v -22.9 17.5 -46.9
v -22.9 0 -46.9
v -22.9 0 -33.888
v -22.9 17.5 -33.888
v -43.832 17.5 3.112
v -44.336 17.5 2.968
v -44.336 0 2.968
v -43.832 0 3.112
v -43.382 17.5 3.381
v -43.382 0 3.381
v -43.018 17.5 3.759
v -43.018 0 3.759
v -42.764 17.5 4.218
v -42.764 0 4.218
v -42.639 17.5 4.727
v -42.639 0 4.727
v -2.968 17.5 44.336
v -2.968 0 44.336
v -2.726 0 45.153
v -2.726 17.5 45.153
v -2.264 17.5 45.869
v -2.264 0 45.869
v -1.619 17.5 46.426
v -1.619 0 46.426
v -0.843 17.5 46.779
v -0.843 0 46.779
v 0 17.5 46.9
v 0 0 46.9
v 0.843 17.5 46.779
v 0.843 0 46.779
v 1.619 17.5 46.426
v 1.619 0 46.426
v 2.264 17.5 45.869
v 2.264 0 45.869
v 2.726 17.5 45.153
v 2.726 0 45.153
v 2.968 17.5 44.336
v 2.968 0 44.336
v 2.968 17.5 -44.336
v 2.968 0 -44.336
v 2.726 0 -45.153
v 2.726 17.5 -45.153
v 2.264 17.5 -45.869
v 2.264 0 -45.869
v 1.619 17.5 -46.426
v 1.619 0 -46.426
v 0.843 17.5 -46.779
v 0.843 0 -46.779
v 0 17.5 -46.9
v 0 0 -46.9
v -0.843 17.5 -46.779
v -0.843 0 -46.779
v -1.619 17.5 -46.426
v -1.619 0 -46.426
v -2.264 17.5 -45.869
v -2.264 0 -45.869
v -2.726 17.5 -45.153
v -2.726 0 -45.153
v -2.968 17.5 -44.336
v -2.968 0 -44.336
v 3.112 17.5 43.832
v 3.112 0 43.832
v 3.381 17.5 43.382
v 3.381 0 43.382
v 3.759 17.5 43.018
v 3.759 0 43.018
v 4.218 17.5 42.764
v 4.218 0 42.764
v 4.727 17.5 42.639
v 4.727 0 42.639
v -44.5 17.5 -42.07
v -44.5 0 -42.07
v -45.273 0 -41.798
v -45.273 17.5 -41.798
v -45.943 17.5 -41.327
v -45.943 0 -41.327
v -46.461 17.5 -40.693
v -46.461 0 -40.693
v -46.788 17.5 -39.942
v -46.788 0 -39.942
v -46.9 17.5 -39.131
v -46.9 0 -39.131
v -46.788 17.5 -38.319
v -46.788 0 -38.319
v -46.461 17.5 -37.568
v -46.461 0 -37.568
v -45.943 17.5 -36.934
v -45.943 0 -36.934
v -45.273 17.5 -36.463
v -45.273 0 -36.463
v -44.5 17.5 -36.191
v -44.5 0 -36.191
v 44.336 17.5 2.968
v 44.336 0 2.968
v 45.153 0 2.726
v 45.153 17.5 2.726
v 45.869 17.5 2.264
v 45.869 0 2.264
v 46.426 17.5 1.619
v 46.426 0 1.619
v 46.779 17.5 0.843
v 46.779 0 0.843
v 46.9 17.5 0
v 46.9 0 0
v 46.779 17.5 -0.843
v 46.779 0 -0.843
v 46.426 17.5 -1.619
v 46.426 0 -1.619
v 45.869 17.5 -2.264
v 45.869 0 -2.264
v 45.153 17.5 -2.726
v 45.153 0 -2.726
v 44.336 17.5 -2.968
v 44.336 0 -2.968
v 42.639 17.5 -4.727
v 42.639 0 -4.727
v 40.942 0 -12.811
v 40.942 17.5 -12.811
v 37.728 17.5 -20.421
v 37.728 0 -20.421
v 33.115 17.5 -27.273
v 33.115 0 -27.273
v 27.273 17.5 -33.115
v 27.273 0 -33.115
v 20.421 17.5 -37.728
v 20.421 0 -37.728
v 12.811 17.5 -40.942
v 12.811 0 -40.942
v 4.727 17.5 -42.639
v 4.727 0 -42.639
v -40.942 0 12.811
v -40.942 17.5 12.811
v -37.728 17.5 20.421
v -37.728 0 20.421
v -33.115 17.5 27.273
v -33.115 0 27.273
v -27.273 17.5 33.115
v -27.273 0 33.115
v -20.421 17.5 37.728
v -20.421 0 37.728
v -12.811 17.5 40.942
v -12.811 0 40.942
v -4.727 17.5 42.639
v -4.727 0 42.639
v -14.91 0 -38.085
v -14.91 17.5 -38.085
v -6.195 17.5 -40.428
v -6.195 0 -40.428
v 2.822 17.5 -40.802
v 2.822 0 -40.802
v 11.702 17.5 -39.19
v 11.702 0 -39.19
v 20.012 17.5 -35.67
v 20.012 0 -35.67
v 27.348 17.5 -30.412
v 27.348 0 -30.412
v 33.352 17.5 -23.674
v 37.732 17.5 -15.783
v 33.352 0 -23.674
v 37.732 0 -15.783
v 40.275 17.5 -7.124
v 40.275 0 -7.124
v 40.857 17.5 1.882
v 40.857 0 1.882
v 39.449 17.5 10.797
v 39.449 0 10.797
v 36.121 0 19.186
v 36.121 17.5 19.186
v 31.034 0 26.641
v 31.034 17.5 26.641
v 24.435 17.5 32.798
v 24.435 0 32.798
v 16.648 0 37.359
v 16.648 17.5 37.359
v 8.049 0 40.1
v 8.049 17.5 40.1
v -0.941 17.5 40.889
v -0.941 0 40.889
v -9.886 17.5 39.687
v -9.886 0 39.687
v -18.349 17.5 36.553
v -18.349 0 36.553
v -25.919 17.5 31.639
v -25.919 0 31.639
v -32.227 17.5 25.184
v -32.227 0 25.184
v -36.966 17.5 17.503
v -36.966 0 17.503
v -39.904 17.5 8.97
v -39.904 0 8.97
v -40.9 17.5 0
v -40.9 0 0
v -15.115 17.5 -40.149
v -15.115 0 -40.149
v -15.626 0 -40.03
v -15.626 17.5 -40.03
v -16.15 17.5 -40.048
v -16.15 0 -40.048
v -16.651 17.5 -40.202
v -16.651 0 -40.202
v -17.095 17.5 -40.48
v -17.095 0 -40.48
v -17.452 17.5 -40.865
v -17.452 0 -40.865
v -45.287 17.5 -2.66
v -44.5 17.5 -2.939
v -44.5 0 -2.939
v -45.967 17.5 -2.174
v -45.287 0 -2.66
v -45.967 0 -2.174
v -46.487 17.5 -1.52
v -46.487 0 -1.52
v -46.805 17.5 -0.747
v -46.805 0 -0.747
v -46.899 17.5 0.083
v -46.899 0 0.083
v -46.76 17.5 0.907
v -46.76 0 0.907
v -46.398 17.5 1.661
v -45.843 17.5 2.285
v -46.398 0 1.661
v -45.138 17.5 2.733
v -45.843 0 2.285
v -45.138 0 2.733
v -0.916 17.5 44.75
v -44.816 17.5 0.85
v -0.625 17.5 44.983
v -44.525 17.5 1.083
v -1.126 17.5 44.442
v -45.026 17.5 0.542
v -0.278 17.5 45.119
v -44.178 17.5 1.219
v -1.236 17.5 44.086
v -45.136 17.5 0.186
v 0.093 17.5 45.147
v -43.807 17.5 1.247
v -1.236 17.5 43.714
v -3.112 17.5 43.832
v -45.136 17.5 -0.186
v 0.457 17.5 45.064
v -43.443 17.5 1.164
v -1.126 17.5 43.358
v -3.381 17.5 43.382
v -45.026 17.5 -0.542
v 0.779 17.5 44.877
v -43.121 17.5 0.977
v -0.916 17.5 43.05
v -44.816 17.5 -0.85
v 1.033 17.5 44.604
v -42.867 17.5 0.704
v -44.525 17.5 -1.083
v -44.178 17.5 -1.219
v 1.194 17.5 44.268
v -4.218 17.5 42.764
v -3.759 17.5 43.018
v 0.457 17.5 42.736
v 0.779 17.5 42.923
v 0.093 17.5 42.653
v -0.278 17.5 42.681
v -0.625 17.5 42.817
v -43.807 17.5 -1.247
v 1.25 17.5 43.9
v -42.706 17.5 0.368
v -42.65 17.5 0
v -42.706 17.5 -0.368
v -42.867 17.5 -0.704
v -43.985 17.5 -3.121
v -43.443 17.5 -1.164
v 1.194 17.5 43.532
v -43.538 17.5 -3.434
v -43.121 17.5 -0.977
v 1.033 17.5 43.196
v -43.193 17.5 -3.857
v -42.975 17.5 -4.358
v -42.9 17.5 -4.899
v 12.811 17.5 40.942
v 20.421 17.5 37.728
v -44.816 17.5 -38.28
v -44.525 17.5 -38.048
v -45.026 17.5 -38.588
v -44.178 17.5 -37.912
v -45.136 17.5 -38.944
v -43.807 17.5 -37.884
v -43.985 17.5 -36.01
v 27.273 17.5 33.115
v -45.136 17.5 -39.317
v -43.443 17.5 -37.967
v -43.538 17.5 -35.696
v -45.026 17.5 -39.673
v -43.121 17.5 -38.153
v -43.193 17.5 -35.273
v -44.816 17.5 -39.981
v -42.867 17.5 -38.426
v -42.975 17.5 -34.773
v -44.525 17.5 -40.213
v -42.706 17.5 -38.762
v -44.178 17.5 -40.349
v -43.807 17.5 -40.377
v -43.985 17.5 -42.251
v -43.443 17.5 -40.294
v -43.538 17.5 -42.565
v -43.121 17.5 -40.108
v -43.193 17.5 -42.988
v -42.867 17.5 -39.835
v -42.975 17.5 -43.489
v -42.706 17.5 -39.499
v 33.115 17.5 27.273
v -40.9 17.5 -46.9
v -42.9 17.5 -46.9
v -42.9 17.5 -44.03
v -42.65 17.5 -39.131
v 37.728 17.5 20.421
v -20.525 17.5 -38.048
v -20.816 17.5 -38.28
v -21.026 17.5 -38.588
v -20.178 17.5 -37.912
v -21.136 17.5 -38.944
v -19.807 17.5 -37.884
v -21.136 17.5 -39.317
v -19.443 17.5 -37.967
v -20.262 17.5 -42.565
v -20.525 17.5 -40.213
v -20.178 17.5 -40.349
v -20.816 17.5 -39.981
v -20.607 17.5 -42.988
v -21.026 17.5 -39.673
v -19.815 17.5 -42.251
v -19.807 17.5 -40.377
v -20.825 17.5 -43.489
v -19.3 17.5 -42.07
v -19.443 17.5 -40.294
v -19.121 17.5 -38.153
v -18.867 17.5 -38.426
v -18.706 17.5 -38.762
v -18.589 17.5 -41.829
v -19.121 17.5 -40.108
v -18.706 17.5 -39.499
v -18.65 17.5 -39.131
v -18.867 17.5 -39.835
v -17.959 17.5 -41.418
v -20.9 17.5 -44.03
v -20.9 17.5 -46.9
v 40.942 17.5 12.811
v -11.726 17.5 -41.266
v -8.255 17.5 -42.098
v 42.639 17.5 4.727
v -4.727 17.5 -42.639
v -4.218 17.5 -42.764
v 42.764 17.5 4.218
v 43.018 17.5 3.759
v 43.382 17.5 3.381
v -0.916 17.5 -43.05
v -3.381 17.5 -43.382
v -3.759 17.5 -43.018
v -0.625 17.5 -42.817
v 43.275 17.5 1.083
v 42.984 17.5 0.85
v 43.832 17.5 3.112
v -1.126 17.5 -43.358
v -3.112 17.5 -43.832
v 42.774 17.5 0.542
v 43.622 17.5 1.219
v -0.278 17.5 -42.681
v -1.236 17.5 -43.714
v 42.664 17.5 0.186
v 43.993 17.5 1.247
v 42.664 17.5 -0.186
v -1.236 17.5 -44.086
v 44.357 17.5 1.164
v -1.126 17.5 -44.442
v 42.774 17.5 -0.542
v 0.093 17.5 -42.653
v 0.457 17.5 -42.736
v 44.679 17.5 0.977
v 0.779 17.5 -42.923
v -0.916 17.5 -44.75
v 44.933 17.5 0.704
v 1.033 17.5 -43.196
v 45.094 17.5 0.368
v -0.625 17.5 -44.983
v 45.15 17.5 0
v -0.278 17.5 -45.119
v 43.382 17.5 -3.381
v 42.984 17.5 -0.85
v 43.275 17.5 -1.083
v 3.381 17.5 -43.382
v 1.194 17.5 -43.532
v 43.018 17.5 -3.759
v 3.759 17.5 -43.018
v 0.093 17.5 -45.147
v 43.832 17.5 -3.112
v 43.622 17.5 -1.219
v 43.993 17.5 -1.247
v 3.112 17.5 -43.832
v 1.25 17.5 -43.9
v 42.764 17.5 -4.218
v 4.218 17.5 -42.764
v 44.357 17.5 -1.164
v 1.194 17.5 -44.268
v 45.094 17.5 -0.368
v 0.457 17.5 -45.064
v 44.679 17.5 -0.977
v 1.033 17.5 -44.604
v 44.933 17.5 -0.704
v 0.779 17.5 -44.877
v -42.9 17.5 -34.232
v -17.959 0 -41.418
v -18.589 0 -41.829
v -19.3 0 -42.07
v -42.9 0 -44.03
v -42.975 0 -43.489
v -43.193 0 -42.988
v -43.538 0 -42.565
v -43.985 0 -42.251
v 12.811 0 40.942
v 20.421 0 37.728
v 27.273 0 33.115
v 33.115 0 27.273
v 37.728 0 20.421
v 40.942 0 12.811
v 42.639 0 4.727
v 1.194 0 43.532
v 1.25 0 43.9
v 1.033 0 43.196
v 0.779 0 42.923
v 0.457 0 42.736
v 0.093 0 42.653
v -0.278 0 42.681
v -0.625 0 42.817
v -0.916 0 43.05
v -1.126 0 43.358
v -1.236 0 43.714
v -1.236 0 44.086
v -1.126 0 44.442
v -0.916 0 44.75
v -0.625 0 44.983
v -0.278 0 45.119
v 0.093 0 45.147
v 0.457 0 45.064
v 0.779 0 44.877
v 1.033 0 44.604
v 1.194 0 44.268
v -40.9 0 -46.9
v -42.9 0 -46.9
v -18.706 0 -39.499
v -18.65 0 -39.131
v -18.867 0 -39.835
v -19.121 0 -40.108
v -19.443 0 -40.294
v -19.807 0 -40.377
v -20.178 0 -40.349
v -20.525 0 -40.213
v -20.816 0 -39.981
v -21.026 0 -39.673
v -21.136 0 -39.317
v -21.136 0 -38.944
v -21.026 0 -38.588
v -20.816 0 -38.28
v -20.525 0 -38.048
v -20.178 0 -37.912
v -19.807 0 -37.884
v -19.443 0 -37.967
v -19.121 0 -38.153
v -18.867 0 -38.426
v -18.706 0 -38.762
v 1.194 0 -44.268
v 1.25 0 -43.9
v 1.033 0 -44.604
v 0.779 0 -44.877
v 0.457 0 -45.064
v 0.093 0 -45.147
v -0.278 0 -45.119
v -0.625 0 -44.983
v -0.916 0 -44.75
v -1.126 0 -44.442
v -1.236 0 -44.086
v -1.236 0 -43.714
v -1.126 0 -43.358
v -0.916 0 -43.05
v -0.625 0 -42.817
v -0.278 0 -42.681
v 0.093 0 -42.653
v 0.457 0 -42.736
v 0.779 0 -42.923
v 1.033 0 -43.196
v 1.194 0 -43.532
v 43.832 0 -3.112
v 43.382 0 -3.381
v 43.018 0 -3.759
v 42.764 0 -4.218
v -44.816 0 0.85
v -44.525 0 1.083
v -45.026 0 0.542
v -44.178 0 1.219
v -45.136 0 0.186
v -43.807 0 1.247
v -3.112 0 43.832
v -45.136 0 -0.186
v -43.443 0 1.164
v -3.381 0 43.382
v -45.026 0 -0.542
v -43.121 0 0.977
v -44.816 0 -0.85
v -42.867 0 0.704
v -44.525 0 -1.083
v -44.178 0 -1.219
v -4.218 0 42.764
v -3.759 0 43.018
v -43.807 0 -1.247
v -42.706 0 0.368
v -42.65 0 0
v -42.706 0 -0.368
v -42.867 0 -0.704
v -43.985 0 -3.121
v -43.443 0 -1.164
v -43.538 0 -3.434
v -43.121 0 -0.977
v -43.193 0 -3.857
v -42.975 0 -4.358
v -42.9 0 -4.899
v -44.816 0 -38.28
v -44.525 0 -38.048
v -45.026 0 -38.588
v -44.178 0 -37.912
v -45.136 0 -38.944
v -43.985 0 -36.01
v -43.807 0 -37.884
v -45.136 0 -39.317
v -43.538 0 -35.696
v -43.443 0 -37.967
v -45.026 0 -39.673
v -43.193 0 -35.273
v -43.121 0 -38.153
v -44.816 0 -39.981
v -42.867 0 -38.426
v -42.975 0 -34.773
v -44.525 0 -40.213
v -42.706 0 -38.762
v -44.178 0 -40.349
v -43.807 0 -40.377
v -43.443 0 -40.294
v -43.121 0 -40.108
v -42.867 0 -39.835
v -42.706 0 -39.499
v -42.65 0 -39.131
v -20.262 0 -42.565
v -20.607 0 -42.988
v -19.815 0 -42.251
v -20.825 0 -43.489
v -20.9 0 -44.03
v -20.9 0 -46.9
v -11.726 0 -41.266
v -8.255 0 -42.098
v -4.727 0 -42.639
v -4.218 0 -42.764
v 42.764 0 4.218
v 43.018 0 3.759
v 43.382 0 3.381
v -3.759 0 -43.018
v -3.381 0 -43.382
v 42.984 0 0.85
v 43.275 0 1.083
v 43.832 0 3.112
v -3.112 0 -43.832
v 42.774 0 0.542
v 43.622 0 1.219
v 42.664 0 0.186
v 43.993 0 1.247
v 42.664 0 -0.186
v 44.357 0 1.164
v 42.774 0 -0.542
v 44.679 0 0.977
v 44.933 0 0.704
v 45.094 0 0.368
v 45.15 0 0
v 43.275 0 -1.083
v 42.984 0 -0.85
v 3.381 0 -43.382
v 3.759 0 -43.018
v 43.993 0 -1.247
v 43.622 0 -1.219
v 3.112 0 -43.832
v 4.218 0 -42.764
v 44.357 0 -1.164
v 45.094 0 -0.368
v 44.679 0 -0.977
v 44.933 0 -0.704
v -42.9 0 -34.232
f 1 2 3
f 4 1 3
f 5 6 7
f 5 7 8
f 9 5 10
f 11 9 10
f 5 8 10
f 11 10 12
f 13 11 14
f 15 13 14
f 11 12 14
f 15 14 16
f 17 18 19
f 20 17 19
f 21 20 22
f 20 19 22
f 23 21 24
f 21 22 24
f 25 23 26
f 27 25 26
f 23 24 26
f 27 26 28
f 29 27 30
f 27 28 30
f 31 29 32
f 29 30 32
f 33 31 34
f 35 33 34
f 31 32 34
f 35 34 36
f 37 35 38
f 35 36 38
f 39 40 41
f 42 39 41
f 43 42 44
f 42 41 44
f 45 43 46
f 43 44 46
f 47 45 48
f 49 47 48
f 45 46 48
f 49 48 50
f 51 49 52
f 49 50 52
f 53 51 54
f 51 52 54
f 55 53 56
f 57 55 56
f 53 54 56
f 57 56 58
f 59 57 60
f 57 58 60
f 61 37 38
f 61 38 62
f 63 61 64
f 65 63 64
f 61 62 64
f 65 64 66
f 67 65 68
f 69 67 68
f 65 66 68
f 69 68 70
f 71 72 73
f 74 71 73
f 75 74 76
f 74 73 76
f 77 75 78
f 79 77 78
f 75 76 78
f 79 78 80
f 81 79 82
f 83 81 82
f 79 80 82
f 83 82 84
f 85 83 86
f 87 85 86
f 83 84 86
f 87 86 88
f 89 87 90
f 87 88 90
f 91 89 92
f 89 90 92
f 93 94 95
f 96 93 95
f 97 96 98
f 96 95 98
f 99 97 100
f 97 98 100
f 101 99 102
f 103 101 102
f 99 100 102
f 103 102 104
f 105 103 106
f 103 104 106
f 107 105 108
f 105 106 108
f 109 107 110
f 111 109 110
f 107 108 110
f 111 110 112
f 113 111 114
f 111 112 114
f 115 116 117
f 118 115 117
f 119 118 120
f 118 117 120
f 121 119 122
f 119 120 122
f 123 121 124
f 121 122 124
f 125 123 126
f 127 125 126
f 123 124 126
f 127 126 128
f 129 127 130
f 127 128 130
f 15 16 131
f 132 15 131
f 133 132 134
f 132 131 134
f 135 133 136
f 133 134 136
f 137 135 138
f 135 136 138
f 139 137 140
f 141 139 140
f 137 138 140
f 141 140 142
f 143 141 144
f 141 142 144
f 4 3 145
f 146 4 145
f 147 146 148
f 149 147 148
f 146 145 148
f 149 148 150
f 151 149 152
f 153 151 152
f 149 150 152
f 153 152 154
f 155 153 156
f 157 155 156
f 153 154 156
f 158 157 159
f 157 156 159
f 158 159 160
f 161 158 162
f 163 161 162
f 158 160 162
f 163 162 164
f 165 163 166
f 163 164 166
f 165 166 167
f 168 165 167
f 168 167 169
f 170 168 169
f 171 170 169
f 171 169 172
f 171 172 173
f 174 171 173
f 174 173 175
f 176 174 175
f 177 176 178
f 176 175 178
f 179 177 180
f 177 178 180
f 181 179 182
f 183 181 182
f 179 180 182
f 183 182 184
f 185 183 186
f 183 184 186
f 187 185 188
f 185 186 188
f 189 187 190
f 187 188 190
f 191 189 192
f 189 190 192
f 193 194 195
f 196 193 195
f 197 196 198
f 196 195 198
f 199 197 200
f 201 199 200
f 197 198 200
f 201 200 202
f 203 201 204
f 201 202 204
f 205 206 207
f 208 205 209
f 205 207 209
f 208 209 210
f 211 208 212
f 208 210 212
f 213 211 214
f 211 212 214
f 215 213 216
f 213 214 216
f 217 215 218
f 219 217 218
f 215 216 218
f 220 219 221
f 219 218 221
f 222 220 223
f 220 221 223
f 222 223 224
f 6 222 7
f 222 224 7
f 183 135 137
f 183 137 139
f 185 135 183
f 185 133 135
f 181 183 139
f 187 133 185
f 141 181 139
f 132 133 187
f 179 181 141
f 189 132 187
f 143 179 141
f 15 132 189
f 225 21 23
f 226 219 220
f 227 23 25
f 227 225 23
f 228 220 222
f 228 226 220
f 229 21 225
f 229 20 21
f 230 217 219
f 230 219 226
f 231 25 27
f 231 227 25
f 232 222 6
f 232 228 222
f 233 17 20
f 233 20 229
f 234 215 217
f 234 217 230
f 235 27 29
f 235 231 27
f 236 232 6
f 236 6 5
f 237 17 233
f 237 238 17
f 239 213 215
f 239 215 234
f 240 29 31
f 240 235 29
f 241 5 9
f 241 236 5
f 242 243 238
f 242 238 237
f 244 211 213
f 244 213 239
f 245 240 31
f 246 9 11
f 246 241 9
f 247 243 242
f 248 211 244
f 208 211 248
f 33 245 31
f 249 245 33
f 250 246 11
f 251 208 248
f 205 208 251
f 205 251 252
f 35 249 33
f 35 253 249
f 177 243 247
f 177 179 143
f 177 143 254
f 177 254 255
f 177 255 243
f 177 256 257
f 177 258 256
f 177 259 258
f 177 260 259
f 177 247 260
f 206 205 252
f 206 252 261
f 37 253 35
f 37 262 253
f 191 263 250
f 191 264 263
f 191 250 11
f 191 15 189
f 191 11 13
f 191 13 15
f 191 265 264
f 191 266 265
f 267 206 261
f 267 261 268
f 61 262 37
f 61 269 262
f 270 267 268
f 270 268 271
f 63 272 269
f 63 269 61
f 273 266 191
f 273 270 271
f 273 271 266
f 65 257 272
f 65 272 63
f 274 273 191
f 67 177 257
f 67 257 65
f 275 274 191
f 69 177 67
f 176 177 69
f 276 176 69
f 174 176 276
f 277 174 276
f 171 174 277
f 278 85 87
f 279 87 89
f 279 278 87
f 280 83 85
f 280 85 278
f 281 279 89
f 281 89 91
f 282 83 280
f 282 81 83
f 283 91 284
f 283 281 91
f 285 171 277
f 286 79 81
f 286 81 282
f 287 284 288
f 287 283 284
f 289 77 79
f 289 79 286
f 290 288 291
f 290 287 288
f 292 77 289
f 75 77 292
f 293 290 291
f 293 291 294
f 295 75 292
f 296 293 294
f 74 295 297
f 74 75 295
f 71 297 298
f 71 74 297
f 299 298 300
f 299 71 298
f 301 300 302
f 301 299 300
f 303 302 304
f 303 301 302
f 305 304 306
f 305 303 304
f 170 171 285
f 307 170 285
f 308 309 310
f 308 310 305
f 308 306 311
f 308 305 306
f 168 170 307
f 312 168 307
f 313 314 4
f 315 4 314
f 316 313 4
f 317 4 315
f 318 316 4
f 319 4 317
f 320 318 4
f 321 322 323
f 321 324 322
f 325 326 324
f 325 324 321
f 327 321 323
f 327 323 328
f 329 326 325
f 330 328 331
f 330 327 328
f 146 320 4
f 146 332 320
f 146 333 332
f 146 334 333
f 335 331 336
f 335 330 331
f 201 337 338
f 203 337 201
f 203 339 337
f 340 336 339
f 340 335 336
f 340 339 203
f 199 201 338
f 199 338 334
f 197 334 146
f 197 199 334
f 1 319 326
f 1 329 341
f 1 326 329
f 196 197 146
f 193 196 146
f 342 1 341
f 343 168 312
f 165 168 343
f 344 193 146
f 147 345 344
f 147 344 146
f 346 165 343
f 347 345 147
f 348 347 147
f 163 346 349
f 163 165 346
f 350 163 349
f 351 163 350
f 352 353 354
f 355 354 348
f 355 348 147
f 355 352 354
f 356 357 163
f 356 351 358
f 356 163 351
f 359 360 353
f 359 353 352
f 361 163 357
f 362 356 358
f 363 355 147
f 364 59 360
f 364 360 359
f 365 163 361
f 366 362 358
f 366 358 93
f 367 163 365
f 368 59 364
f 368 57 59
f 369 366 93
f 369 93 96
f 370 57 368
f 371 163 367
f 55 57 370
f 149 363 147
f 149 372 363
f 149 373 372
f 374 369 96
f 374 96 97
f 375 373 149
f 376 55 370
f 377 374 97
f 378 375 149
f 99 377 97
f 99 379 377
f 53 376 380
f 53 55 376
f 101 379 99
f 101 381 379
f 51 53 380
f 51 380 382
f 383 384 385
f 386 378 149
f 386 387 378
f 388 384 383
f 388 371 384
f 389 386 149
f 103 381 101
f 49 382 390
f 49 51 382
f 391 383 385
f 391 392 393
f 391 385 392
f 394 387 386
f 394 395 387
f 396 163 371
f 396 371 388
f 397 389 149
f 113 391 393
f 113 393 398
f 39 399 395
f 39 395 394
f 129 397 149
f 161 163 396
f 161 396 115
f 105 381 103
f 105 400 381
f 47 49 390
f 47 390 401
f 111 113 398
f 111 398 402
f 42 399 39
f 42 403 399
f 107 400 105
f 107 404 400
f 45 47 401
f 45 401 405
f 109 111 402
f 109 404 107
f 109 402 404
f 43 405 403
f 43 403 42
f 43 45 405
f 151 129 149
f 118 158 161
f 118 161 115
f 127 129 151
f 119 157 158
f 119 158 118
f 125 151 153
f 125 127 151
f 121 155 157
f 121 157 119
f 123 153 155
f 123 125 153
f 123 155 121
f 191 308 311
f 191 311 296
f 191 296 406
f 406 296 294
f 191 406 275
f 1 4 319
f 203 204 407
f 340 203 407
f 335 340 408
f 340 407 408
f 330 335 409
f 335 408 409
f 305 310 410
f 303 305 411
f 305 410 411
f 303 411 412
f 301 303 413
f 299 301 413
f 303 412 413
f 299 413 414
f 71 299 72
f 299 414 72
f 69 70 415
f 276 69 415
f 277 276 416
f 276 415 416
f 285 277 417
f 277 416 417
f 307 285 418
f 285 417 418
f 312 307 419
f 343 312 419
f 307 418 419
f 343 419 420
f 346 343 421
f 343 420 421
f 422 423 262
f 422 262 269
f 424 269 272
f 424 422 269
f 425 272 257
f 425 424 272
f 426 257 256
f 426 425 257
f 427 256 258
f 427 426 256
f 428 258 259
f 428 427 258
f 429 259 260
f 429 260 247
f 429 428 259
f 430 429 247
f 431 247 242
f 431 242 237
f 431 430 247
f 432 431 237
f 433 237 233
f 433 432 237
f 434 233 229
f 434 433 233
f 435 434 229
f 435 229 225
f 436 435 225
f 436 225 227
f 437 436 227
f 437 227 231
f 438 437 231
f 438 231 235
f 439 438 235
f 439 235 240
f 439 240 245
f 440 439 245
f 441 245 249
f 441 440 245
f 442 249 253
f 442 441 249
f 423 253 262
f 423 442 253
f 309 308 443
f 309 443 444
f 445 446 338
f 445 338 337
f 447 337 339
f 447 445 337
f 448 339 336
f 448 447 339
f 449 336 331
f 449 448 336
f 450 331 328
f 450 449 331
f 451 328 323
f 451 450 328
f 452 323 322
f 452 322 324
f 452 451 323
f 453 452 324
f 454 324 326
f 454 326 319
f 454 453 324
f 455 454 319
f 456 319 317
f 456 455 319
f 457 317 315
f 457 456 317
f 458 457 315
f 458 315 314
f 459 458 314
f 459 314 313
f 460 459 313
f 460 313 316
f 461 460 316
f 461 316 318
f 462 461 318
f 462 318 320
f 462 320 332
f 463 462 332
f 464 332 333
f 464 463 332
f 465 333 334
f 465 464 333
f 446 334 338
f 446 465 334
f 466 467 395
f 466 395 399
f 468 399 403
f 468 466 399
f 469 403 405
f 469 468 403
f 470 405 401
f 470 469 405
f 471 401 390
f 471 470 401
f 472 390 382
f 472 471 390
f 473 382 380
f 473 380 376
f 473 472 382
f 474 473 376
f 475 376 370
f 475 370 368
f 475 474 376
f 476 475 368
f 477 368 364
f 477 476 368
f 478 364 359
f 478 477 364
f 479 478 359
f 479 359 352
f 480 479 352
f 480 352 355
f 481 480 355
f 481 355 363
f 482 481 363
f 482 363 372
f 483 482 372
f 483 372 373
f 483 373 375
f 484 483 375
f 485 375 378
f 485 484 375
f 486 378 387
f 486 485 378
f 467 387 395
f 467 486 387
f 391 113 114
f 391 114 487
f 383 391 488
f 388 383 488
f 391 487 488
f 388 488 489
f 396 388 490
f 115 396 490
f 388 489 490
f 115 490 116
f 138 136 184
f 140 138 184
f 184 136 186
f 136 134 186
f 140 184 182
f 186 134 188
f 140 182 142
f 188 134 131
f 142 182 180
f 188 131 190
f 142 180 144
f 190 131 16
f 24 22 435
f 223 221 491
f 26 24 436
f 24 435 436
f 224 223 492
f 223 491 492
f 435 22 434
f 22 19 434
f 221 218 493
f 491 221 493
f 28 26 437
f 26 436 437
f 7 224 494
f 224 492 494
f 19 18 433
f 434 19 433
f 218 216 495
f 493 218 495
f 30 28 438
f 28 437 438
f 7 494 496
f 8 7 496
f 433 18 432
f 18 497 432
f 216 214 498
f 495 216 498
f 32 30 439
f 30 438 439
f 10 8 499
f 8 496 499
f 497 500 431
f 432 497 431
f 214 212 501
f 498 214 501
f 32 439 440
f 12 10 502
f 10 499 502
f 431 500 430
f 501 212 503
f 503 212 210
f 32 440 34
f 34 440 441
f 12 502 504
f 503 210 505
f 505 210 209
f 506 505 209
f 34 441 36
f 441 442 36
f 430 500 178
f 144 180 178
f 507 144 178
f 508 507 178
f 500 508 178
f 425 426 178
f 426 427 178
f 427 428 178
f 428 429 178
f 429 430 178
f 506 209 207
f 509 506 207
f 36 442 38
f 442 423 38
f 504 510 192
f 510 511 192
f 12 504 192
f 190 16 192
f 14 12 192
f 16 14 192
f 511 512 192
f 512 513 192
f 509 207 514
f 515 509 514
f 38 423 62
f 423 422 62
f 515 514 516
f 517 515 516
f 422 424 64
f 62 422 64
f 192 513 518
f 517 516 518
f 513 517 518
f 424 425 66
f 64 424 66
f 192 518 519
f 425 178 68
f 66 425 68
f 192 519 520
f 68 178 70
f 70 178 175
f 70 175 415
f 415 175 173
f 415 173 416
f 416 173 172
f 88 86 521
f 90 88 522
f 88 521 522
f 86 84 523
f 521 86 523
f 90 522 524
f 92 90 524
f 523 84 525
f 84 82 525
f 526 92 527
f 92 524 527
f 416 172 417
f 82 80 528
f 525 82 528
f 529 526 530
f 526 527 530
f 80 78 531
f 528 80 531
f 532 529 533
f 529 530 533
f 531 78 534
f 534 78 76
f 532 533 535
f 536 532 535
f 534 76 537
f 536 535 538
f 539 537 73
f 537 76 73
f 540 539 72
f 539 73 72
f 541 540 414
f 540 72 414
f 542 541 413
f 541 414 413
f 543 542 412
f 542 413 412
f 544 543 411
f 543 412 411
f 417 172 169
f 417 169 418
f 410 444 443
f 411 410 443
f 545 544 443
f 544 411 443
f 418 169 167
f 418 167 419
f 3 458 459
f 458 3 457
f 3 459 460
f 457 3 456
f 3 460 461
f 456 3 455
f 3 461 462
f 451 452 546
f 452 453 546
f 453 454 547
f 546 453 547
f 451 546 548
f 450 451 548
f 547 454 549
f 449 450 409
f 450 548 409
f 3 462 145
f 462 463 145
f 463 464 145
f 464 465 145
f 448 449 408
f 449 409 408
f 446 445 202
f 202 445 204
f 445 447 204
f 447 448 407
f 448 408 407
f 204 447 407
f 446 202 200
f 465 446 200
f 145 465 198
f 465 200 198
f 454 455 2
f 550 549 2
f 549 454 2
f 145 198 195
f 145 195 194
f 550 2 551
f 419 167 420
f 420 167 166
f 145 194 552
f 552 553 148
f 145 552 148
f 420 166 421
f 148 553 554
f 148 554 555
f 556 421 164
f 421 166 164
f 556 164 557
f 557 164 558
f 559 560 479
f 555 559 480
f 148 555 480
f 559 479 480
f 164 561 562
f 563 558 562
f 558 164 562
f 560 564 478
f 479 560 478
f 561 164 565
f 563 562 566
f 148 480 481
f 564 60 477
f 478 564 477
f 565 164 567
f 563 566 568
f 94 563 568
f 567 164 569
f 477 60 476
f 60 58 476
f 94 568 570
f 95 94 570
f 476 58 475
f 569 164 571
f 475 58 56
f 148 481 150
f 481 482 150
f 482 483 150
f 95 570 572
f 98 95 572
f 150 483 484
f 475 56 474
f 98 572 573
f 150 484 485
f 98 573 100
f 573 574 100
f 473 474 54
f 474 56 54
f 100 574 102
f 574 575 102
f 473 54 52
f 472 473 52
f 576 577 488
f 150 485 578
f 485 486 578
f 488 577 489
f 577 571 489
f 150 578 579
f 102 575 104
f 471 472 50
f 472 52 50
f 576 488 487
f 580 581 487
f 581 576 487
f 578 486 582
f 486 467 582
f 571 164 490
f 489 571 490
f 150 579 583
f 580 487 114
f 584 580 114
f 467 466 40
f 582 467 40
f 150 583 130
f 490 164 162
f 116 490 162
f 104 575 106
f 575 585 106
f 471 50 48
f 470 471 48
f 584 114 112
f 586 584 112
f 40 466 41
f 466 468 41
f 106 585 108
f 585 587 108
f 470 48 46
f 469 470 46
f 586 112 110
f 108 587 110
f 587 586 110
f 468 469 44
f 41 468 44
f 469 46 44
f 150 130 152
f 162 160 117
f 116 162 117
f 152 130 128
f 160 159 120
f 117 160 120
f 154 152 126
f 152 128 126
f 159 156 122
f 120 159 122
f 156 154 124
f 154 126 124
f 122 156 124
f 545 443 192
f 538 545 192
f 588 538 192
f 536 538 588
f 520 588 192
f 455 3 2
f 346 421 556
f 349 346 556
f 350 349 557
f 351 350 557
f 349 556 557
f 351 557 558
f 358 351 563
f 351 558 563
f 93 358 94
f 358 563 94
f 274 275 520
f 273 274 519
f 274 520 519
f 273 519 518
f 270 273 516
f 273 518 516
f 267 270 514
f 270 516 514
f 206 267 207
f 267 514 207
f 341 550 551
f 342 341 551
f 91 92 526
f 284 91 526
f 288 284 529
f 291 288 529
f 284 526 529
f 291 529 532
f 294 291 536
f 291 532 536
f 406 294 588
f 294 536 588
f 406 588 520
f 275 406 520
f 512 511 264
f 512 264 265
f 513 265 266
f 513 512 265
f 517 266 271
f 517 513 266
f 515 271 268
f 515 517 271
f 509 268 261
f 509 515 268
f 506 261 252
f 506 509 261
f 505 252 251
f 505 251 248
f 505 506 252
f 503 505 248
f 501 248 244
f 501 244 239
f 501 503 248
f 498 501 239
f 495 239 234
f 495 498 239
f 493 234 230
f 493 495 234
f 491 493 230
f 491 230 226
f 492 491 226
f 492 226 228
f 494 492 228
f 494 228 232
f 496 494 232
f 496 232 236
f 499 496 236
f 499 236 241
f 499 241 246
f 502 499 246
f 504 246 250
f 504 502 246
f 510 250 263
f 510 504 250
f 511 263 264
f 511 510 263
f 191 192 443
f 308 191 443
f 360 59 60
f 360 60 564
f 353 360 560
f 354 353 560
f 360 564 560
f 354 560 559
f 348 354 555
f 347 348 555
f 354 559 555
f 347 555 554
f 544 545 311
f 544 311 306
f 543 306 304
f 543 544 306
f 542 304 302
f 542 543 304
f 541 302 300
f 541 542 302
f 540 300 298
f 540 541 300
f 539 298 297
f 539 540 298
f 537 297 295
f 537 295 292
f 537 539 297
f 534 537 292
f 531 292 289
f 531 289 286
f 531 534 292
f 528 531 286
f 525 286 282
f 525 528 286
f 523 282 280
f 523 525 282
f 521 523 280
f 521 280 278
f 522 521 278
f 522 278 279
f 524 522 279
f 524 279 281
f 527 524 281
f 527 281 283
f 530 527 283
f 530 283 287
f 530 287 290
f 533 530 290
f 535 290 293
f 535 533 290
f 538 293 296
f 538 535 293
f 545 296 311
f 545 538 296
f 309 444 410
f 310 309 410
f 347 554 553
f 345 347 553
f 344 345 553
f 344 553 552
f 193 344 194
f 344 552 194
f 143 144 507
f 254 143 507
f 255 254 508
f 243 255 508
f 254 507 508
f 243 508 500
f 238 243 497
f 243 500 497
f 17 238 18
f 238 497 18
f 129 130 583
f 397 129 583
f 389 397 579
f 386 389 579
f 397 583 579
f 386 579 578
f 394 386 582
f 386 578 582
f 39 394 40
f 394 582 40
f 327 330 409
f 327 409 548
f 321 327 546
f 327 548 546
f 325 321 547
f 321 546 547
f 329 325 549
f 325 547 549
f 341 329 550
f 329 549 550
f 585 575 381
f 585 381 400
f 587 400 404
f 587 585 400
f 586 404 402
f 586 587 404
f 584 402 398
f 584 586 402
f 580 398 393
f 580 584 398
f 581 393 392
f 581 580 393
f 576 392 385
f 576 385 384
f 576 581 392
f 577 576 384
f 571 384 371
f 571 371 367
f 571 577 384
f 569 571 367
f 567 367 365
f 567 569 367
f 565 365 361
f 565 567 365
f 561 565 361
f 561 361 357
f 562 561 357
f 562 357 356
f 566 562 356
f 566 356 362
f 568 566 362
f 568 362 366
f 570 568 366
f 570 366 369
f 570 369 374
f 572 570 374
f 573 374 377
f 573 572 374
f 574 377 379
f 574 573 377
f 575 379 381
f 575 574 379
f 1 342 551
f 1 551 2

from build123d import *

# Parameters (mm, degrees)
SKETCH_1_R      = 1.25
EXTRUDE_1_DEPTH = 17.5


with BuildPart() as part:
    # 草图1 → 凸台-拉伸1 (new body)
    with BuildSketch(Plane(origin=(0, 0, 0), x_dir=(1, 0, 0), z_dir=(0, 1, 0))):
        with BuildLine():
            Line((-40.9, 0), (-40.9, 46.9))
            Line((-40.9, 46.9), (-42.9, 46.9))
            Line((-42.9, 46.9), (-42.9, 44.02953021))
            ThreePointArc((-42.9, 44.02953021), (-43.350806662, 42.764619146), (-44.5, 42.069938416))
            ThreePointArc((-44.5, 42.069938416), (-46.9, 39.130550724), (-44.5, 36.191163033))
            ThreePointArc((-44.5, 36.191163033), (-43.350806662, 35.496482303), (-42.9, 34.231571239))
            Line((-42.9, 34.231571239), (-42.9, 4.898979486))
            ThreePointArc((-42.9, 4.898979486), (-43.350806662, 3.634068421), (-44.5, 2.939387691))
            ThreePointArc((-44.5, 2.939387691), (-46.898844518, -0.083255983), (-44.335990888, -2.968149583))
            ThreePointArc((-44.335990888, -2.968149583), (-43.187596963, -3.557987573), (-42.638827361, -4.726563367))
            ThreePointArc((-42.638827361, -4.726563367), (-30.334880913, -30.334880913), (-4.726563367, -42.638827361))
            ThreePointArc((-4.726563367, -42.638827361), (-3.557987573, -43.187596963), (-2.968149583, -44.335990888))
            ThreePointArc((-2.968149583, -44.335990888), (0, -46.9), (2.968149583, -44.335990888))
            ThreePointArc((2.968149583, -44.335990888), (3.557987573, -43.187596963), (4.726563367, -42.638827361))
            ThreePointArc((4.726563367, -42.638827361), (30.334880913, -30.334880913), (42.638827361, -4.726563367))
            ThreePointArc((42.638827361, -4.726563367), (43.187596963, -3.557987573), (44.335990888, -2.968149583))
            ThreePointArc((44.335990888, -2.968149583), (46.9, 0), (44.335990888, 2.968149583))
            ThreePointArc((44.335990888, 2.968149583), (43.187596963, 3.557987573), (42.638827361, 4.726563367))
            ThreePointArc((42.638827361, 4.726563367), (30.334880913, 30.334880913), (4.726563367, 42.638827361))
            ThreePointArc((4.726563367, 42.638827361), (3.557987573, 43.187596963), (2.968149583, 44.335990888))
            ThreePointArc((2.968149583, 44.335990888), (0, 46.9), (-2.968149583, 44.335990888))
            ThreePointArc((-2.968149583, 44.335990888), (-3.557987573, 43.187596963), (-4.726563367, 42.638827361))
            ThreePointArc((-4.726563367, 42.638827361), (-9.998714121, 41.718529647), (-15.115253688, 40.148961455))
            ThreePointArc((-15.115253688, 40.148961455), (-16.405630214, 40.108391944), (-17.451956512, 40.864645036))
            ThreePointArc((-17.451956512, 40.864645036), (-18.261151224, 41.643352884), (-19.3, 42.069938416))
            ThreePointArc((-19.3, 42.069938416), (-20.449193338, 42.764619146), (-20.9, 44.02953021))
            Line((-20.9, 44.02953021), (-20.9, 46.9))
            Line((-20.9, 46.9), (-22.9, 46.9))
            Line((-22.9, 46.9), (-22.9, 33.888050991))
            ThreePointArc((-22.9, 33.888050991), (36.120769649, -19.185932346), (-40.9, 0))
        make_face()
        with Locations((0, 43.9)):
            Circle(SKETCH_1_R, mode=Mode.SUBTRACT)
        with Locations((43.9, 0)):
            Circle(SKETCH_1_R, mode=Mode.SUBTRACT)
        with Locations((0, -43.9)):
            Circle(SKETCH_1_R, mode=Mode.SUBTRACT)
        with Locations((-43.9, 0)):
            Circle(SKETCH_1_R, mode=Mode.SUBTRACT)
        with Locations((-19.9, 39.130550724)):
            Circle(SKETCH_1_R, mode=Mode.SUBTRACT)
        with Locations((-43.9, 39.130550724)):
            Circle(SKETCH_1_R, mode=Mode.SUBTRACT)
    extrude(amount=EXTRUDE_1_DEPTH)


solid = part.part
